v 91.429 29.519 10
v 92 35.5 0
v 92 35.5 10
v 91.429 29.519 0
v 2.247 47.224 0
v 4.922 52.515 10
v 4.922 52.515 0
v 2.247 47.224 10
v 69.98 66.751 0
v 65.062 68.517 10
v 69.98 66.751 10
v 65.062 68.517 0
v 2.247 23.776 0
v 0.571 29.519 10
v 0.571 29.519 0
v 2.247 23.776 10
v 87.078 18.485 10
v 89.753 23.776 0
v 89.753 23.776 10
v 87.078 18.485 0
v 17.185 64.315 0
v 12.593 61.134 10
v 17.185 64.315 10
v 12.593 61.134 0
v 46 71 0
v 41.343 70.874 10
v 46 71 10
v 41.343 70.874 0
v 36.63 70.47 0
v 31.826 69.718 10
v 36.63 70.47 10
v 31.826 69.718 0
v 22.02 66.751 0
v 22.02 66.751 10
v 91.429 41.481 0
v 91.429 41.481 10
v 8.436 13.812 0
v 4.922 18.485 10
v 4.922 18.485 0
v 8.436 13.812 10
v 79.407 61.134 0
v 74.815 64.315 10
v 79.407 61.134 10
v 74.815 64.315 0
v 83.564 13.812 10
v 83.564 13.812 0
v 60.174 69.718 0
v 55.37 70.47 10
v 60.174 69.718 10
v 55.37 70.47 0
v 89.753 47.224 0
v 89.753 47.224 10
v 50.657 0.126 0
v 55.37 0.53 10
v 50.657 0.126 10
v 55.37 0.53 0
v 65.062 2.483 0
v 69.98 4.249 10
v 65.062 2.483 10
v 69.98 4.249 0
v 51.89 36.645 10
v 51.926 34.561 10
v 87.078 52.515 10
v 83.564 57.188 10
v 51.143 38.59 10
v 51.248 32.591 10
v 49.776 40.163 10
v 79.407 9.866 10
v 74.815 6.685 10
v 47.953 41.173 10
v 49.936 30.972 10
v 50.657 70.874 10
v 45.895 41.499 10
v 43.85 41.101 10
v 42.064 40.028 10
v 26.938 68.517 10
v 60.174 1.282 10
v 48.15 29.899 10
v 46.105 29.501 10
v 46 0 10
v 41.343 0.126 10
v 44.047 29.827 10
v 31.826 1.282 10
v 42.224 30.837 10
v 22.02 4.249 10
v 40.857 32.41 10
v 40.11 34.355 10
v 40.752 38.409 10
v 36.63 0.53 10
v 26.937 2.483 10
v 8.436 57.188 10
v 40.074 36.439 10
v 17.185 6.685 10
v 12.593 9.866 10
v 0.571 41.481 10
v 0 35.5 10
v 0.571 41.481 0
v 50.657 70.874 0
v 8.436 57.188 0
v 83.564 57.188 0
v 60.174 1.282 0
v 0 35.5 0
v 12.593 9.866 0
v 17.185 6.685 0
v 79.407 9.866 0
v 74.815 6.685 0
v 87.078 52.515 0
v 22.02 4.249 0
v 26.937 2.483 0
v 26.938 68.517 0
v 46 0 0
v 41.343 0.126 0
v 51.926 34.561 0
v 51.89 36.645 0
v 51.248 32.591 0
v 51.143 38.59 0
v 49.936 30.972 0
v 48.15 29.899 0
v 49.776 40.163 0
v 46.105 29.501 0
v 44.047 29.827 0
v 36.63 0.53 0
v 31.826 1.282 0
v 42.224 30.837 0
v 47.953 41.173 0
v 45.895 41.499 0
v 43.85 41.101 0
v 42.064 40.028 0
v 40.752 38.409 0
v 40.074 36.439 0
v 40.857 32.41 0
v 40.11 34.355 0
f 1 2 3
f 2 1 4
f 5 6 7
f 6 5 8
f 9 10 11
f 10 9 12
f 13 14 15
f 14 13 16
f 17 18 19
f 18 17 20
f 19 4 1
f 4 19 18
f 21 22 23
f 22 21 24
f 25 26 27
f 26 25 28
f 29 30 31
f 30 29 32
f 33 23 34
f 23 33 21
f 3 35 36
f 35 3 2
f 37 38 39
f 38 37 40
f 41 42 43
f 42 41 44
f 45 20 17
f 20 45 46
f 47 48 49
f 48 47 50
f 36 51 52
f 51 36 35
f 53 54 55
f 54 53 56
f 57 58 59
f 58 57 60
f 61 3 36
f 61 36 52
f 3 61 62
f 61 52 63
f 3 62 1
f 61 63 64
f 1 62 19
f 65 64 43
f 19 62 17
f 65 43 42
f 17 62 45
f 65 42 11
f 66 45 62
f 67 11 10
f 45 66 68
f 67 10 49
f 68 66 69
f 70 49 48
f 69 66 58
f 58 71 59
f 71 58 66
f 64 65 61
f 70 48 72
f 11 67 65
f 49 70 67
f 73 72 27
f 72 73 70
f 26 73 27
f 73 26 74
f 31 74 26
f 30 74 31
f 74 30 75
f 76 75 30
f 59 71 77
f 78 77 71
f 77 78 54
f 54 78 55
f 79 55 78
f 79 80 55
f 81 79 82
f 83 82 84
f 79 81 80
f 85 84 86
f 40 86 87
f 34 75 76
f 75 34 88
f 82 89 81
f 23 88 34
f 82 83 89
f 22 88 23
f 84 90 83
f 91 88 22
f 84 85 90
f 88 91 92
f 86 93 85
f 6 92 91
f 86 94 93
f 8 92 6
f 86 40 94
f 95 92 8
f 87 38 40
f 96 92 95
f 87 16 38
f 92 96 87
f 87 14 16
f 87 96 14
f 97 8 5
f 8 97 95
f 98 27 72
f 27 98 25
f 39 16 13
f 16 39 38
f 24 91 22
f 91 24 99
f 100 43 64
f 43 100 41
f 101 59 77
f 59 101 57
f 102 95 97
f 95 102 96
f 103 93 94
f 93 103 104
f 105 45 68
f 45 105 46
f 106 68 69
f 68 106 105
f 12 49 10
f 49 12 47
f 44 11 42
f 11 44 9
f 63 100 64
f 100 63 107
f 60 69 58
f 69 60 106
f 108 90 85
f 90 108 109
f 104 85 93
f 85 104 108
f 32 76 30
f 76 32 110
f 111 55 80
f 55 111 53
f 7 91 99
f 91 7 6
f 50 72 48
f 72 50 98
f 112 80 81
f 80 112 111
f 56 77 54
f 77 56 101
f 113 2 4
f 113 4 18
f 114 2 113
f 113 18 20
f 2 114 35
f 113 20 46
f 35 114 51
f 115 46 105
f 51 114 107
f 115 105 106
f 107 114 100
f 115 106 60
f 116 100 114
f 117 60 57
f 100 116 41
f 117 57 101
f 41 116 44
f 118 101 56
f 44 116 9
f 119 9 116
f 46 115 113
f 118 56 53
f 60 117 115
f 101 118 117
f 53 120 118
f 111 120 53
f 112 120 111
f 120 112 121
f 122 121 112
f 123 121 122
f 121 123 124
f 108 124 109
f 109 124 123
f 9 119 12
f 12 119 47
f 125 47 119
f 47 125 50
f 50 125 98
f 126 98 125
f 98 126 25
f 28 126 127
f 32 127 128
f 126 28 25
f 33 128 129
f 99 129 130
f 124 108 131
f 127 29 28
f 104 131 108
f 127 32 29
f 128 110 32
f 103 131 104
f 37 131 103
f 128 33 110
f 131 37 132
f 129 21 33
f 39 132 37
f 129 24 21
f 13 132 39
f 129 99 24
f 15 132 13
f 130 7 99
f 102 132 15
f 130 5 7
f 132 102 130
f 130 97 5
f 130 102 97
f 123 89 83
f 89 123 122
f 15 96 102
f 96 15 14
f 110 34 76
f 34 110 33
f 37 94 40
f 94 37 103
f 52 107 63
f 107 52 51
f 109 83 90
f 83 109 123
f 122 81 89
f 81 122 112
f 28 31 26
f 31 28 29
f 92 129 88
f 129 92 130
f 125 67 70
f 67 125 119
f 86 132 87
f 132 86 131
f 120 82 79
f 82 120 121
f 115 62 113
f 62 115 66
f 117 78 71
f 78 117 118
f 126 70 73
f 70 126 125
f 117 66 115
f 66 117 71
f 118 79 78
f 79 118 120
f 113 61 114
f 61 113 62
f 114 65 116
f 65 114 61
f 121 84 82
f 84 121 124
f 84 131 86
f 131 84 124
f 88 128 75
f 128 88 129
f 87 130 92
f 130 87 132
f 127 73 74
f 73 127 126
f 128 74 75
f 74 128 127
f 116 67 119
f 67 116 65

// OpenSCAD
$fn = 32;

// ----------------------------------------------------------------------
// Cam plate: double_lobe cam, base R32
// ----------------------------------------------------------------------

// --- parameters (mm) ---
base_r = 32;              // base circle radius
lobe_h = 14;              // cam lobe rise
bore_r = 6;               // shaft bore radius
plate_t = 10;             // plate thickness, Z (extrusion height)

profile = [[92, 35.5], [91.429, 41.481], [89.753, 47.224], [87.078, 52.515], [83.564, 57.188], [79.407, 61.134], [74.815, 64.315], [69.98, 66.751], [65.062, 68.517], [60.174, 69.718], [55.37, 70.47], [50.657, 70.874], [46, 71], [41.343, 70.874], [36.63, 70.47], [31.826, 69.718], [26.938, 68.517], [22.02, 66.751], [17.185, 64.315], [12.593, 61.134], [8.436, 57.188], [4.922, 52.515], [2.247, 47.224], [0.571, 41.481], [0, 35.5], [0.571, 29.519], [2.247, 23.776], [4.922, 18.485], [8.436, 13.812], [12.593, 9.866], [17.185, 6.685], [22.02, 4.249], [26.937, 2.483], [31.826, 1.282], [36.63, 0.53], [41.343, 0.126], [46, 0], [50.657, 0.126], [55.37, 0.53], [60.174, 1.282], [65.062, 2.483], [69.98, 4.249], [74.815, 6.685], [79.407, 9.866], [83.564, 13.812], [87.078, 18.485], [89.753, 23.776], [91.429, 29.519]];  // primary outline, 48 points, counter clockwise
void_1 = [[51.89, 36.645], [51.143, 38.59], [49.776, 40.163], [47.953, 41.173], [45.895, 41.499], [43.85, 41.101], [42.064, 40.028], [40.752, 38.409], [40.074, 36.439], [40.11, 34.355], [40.857, 32.41], [42.224, 30.837], [44.047, 29.827], [46.105, 29.501], [48.15, 29.899], [49.936, 30.972], [51.248, 32.591], [51.926, 34.561]];  // shaft bore, 18 points

// --- the one profile operation ---
difference() {
  linear_extrude(height = plate_t) polygon(points = profile);
  translate([0, 0, -1])
    linear_extrude(height = plate_t + 2) polygon(points = void_1);
}
